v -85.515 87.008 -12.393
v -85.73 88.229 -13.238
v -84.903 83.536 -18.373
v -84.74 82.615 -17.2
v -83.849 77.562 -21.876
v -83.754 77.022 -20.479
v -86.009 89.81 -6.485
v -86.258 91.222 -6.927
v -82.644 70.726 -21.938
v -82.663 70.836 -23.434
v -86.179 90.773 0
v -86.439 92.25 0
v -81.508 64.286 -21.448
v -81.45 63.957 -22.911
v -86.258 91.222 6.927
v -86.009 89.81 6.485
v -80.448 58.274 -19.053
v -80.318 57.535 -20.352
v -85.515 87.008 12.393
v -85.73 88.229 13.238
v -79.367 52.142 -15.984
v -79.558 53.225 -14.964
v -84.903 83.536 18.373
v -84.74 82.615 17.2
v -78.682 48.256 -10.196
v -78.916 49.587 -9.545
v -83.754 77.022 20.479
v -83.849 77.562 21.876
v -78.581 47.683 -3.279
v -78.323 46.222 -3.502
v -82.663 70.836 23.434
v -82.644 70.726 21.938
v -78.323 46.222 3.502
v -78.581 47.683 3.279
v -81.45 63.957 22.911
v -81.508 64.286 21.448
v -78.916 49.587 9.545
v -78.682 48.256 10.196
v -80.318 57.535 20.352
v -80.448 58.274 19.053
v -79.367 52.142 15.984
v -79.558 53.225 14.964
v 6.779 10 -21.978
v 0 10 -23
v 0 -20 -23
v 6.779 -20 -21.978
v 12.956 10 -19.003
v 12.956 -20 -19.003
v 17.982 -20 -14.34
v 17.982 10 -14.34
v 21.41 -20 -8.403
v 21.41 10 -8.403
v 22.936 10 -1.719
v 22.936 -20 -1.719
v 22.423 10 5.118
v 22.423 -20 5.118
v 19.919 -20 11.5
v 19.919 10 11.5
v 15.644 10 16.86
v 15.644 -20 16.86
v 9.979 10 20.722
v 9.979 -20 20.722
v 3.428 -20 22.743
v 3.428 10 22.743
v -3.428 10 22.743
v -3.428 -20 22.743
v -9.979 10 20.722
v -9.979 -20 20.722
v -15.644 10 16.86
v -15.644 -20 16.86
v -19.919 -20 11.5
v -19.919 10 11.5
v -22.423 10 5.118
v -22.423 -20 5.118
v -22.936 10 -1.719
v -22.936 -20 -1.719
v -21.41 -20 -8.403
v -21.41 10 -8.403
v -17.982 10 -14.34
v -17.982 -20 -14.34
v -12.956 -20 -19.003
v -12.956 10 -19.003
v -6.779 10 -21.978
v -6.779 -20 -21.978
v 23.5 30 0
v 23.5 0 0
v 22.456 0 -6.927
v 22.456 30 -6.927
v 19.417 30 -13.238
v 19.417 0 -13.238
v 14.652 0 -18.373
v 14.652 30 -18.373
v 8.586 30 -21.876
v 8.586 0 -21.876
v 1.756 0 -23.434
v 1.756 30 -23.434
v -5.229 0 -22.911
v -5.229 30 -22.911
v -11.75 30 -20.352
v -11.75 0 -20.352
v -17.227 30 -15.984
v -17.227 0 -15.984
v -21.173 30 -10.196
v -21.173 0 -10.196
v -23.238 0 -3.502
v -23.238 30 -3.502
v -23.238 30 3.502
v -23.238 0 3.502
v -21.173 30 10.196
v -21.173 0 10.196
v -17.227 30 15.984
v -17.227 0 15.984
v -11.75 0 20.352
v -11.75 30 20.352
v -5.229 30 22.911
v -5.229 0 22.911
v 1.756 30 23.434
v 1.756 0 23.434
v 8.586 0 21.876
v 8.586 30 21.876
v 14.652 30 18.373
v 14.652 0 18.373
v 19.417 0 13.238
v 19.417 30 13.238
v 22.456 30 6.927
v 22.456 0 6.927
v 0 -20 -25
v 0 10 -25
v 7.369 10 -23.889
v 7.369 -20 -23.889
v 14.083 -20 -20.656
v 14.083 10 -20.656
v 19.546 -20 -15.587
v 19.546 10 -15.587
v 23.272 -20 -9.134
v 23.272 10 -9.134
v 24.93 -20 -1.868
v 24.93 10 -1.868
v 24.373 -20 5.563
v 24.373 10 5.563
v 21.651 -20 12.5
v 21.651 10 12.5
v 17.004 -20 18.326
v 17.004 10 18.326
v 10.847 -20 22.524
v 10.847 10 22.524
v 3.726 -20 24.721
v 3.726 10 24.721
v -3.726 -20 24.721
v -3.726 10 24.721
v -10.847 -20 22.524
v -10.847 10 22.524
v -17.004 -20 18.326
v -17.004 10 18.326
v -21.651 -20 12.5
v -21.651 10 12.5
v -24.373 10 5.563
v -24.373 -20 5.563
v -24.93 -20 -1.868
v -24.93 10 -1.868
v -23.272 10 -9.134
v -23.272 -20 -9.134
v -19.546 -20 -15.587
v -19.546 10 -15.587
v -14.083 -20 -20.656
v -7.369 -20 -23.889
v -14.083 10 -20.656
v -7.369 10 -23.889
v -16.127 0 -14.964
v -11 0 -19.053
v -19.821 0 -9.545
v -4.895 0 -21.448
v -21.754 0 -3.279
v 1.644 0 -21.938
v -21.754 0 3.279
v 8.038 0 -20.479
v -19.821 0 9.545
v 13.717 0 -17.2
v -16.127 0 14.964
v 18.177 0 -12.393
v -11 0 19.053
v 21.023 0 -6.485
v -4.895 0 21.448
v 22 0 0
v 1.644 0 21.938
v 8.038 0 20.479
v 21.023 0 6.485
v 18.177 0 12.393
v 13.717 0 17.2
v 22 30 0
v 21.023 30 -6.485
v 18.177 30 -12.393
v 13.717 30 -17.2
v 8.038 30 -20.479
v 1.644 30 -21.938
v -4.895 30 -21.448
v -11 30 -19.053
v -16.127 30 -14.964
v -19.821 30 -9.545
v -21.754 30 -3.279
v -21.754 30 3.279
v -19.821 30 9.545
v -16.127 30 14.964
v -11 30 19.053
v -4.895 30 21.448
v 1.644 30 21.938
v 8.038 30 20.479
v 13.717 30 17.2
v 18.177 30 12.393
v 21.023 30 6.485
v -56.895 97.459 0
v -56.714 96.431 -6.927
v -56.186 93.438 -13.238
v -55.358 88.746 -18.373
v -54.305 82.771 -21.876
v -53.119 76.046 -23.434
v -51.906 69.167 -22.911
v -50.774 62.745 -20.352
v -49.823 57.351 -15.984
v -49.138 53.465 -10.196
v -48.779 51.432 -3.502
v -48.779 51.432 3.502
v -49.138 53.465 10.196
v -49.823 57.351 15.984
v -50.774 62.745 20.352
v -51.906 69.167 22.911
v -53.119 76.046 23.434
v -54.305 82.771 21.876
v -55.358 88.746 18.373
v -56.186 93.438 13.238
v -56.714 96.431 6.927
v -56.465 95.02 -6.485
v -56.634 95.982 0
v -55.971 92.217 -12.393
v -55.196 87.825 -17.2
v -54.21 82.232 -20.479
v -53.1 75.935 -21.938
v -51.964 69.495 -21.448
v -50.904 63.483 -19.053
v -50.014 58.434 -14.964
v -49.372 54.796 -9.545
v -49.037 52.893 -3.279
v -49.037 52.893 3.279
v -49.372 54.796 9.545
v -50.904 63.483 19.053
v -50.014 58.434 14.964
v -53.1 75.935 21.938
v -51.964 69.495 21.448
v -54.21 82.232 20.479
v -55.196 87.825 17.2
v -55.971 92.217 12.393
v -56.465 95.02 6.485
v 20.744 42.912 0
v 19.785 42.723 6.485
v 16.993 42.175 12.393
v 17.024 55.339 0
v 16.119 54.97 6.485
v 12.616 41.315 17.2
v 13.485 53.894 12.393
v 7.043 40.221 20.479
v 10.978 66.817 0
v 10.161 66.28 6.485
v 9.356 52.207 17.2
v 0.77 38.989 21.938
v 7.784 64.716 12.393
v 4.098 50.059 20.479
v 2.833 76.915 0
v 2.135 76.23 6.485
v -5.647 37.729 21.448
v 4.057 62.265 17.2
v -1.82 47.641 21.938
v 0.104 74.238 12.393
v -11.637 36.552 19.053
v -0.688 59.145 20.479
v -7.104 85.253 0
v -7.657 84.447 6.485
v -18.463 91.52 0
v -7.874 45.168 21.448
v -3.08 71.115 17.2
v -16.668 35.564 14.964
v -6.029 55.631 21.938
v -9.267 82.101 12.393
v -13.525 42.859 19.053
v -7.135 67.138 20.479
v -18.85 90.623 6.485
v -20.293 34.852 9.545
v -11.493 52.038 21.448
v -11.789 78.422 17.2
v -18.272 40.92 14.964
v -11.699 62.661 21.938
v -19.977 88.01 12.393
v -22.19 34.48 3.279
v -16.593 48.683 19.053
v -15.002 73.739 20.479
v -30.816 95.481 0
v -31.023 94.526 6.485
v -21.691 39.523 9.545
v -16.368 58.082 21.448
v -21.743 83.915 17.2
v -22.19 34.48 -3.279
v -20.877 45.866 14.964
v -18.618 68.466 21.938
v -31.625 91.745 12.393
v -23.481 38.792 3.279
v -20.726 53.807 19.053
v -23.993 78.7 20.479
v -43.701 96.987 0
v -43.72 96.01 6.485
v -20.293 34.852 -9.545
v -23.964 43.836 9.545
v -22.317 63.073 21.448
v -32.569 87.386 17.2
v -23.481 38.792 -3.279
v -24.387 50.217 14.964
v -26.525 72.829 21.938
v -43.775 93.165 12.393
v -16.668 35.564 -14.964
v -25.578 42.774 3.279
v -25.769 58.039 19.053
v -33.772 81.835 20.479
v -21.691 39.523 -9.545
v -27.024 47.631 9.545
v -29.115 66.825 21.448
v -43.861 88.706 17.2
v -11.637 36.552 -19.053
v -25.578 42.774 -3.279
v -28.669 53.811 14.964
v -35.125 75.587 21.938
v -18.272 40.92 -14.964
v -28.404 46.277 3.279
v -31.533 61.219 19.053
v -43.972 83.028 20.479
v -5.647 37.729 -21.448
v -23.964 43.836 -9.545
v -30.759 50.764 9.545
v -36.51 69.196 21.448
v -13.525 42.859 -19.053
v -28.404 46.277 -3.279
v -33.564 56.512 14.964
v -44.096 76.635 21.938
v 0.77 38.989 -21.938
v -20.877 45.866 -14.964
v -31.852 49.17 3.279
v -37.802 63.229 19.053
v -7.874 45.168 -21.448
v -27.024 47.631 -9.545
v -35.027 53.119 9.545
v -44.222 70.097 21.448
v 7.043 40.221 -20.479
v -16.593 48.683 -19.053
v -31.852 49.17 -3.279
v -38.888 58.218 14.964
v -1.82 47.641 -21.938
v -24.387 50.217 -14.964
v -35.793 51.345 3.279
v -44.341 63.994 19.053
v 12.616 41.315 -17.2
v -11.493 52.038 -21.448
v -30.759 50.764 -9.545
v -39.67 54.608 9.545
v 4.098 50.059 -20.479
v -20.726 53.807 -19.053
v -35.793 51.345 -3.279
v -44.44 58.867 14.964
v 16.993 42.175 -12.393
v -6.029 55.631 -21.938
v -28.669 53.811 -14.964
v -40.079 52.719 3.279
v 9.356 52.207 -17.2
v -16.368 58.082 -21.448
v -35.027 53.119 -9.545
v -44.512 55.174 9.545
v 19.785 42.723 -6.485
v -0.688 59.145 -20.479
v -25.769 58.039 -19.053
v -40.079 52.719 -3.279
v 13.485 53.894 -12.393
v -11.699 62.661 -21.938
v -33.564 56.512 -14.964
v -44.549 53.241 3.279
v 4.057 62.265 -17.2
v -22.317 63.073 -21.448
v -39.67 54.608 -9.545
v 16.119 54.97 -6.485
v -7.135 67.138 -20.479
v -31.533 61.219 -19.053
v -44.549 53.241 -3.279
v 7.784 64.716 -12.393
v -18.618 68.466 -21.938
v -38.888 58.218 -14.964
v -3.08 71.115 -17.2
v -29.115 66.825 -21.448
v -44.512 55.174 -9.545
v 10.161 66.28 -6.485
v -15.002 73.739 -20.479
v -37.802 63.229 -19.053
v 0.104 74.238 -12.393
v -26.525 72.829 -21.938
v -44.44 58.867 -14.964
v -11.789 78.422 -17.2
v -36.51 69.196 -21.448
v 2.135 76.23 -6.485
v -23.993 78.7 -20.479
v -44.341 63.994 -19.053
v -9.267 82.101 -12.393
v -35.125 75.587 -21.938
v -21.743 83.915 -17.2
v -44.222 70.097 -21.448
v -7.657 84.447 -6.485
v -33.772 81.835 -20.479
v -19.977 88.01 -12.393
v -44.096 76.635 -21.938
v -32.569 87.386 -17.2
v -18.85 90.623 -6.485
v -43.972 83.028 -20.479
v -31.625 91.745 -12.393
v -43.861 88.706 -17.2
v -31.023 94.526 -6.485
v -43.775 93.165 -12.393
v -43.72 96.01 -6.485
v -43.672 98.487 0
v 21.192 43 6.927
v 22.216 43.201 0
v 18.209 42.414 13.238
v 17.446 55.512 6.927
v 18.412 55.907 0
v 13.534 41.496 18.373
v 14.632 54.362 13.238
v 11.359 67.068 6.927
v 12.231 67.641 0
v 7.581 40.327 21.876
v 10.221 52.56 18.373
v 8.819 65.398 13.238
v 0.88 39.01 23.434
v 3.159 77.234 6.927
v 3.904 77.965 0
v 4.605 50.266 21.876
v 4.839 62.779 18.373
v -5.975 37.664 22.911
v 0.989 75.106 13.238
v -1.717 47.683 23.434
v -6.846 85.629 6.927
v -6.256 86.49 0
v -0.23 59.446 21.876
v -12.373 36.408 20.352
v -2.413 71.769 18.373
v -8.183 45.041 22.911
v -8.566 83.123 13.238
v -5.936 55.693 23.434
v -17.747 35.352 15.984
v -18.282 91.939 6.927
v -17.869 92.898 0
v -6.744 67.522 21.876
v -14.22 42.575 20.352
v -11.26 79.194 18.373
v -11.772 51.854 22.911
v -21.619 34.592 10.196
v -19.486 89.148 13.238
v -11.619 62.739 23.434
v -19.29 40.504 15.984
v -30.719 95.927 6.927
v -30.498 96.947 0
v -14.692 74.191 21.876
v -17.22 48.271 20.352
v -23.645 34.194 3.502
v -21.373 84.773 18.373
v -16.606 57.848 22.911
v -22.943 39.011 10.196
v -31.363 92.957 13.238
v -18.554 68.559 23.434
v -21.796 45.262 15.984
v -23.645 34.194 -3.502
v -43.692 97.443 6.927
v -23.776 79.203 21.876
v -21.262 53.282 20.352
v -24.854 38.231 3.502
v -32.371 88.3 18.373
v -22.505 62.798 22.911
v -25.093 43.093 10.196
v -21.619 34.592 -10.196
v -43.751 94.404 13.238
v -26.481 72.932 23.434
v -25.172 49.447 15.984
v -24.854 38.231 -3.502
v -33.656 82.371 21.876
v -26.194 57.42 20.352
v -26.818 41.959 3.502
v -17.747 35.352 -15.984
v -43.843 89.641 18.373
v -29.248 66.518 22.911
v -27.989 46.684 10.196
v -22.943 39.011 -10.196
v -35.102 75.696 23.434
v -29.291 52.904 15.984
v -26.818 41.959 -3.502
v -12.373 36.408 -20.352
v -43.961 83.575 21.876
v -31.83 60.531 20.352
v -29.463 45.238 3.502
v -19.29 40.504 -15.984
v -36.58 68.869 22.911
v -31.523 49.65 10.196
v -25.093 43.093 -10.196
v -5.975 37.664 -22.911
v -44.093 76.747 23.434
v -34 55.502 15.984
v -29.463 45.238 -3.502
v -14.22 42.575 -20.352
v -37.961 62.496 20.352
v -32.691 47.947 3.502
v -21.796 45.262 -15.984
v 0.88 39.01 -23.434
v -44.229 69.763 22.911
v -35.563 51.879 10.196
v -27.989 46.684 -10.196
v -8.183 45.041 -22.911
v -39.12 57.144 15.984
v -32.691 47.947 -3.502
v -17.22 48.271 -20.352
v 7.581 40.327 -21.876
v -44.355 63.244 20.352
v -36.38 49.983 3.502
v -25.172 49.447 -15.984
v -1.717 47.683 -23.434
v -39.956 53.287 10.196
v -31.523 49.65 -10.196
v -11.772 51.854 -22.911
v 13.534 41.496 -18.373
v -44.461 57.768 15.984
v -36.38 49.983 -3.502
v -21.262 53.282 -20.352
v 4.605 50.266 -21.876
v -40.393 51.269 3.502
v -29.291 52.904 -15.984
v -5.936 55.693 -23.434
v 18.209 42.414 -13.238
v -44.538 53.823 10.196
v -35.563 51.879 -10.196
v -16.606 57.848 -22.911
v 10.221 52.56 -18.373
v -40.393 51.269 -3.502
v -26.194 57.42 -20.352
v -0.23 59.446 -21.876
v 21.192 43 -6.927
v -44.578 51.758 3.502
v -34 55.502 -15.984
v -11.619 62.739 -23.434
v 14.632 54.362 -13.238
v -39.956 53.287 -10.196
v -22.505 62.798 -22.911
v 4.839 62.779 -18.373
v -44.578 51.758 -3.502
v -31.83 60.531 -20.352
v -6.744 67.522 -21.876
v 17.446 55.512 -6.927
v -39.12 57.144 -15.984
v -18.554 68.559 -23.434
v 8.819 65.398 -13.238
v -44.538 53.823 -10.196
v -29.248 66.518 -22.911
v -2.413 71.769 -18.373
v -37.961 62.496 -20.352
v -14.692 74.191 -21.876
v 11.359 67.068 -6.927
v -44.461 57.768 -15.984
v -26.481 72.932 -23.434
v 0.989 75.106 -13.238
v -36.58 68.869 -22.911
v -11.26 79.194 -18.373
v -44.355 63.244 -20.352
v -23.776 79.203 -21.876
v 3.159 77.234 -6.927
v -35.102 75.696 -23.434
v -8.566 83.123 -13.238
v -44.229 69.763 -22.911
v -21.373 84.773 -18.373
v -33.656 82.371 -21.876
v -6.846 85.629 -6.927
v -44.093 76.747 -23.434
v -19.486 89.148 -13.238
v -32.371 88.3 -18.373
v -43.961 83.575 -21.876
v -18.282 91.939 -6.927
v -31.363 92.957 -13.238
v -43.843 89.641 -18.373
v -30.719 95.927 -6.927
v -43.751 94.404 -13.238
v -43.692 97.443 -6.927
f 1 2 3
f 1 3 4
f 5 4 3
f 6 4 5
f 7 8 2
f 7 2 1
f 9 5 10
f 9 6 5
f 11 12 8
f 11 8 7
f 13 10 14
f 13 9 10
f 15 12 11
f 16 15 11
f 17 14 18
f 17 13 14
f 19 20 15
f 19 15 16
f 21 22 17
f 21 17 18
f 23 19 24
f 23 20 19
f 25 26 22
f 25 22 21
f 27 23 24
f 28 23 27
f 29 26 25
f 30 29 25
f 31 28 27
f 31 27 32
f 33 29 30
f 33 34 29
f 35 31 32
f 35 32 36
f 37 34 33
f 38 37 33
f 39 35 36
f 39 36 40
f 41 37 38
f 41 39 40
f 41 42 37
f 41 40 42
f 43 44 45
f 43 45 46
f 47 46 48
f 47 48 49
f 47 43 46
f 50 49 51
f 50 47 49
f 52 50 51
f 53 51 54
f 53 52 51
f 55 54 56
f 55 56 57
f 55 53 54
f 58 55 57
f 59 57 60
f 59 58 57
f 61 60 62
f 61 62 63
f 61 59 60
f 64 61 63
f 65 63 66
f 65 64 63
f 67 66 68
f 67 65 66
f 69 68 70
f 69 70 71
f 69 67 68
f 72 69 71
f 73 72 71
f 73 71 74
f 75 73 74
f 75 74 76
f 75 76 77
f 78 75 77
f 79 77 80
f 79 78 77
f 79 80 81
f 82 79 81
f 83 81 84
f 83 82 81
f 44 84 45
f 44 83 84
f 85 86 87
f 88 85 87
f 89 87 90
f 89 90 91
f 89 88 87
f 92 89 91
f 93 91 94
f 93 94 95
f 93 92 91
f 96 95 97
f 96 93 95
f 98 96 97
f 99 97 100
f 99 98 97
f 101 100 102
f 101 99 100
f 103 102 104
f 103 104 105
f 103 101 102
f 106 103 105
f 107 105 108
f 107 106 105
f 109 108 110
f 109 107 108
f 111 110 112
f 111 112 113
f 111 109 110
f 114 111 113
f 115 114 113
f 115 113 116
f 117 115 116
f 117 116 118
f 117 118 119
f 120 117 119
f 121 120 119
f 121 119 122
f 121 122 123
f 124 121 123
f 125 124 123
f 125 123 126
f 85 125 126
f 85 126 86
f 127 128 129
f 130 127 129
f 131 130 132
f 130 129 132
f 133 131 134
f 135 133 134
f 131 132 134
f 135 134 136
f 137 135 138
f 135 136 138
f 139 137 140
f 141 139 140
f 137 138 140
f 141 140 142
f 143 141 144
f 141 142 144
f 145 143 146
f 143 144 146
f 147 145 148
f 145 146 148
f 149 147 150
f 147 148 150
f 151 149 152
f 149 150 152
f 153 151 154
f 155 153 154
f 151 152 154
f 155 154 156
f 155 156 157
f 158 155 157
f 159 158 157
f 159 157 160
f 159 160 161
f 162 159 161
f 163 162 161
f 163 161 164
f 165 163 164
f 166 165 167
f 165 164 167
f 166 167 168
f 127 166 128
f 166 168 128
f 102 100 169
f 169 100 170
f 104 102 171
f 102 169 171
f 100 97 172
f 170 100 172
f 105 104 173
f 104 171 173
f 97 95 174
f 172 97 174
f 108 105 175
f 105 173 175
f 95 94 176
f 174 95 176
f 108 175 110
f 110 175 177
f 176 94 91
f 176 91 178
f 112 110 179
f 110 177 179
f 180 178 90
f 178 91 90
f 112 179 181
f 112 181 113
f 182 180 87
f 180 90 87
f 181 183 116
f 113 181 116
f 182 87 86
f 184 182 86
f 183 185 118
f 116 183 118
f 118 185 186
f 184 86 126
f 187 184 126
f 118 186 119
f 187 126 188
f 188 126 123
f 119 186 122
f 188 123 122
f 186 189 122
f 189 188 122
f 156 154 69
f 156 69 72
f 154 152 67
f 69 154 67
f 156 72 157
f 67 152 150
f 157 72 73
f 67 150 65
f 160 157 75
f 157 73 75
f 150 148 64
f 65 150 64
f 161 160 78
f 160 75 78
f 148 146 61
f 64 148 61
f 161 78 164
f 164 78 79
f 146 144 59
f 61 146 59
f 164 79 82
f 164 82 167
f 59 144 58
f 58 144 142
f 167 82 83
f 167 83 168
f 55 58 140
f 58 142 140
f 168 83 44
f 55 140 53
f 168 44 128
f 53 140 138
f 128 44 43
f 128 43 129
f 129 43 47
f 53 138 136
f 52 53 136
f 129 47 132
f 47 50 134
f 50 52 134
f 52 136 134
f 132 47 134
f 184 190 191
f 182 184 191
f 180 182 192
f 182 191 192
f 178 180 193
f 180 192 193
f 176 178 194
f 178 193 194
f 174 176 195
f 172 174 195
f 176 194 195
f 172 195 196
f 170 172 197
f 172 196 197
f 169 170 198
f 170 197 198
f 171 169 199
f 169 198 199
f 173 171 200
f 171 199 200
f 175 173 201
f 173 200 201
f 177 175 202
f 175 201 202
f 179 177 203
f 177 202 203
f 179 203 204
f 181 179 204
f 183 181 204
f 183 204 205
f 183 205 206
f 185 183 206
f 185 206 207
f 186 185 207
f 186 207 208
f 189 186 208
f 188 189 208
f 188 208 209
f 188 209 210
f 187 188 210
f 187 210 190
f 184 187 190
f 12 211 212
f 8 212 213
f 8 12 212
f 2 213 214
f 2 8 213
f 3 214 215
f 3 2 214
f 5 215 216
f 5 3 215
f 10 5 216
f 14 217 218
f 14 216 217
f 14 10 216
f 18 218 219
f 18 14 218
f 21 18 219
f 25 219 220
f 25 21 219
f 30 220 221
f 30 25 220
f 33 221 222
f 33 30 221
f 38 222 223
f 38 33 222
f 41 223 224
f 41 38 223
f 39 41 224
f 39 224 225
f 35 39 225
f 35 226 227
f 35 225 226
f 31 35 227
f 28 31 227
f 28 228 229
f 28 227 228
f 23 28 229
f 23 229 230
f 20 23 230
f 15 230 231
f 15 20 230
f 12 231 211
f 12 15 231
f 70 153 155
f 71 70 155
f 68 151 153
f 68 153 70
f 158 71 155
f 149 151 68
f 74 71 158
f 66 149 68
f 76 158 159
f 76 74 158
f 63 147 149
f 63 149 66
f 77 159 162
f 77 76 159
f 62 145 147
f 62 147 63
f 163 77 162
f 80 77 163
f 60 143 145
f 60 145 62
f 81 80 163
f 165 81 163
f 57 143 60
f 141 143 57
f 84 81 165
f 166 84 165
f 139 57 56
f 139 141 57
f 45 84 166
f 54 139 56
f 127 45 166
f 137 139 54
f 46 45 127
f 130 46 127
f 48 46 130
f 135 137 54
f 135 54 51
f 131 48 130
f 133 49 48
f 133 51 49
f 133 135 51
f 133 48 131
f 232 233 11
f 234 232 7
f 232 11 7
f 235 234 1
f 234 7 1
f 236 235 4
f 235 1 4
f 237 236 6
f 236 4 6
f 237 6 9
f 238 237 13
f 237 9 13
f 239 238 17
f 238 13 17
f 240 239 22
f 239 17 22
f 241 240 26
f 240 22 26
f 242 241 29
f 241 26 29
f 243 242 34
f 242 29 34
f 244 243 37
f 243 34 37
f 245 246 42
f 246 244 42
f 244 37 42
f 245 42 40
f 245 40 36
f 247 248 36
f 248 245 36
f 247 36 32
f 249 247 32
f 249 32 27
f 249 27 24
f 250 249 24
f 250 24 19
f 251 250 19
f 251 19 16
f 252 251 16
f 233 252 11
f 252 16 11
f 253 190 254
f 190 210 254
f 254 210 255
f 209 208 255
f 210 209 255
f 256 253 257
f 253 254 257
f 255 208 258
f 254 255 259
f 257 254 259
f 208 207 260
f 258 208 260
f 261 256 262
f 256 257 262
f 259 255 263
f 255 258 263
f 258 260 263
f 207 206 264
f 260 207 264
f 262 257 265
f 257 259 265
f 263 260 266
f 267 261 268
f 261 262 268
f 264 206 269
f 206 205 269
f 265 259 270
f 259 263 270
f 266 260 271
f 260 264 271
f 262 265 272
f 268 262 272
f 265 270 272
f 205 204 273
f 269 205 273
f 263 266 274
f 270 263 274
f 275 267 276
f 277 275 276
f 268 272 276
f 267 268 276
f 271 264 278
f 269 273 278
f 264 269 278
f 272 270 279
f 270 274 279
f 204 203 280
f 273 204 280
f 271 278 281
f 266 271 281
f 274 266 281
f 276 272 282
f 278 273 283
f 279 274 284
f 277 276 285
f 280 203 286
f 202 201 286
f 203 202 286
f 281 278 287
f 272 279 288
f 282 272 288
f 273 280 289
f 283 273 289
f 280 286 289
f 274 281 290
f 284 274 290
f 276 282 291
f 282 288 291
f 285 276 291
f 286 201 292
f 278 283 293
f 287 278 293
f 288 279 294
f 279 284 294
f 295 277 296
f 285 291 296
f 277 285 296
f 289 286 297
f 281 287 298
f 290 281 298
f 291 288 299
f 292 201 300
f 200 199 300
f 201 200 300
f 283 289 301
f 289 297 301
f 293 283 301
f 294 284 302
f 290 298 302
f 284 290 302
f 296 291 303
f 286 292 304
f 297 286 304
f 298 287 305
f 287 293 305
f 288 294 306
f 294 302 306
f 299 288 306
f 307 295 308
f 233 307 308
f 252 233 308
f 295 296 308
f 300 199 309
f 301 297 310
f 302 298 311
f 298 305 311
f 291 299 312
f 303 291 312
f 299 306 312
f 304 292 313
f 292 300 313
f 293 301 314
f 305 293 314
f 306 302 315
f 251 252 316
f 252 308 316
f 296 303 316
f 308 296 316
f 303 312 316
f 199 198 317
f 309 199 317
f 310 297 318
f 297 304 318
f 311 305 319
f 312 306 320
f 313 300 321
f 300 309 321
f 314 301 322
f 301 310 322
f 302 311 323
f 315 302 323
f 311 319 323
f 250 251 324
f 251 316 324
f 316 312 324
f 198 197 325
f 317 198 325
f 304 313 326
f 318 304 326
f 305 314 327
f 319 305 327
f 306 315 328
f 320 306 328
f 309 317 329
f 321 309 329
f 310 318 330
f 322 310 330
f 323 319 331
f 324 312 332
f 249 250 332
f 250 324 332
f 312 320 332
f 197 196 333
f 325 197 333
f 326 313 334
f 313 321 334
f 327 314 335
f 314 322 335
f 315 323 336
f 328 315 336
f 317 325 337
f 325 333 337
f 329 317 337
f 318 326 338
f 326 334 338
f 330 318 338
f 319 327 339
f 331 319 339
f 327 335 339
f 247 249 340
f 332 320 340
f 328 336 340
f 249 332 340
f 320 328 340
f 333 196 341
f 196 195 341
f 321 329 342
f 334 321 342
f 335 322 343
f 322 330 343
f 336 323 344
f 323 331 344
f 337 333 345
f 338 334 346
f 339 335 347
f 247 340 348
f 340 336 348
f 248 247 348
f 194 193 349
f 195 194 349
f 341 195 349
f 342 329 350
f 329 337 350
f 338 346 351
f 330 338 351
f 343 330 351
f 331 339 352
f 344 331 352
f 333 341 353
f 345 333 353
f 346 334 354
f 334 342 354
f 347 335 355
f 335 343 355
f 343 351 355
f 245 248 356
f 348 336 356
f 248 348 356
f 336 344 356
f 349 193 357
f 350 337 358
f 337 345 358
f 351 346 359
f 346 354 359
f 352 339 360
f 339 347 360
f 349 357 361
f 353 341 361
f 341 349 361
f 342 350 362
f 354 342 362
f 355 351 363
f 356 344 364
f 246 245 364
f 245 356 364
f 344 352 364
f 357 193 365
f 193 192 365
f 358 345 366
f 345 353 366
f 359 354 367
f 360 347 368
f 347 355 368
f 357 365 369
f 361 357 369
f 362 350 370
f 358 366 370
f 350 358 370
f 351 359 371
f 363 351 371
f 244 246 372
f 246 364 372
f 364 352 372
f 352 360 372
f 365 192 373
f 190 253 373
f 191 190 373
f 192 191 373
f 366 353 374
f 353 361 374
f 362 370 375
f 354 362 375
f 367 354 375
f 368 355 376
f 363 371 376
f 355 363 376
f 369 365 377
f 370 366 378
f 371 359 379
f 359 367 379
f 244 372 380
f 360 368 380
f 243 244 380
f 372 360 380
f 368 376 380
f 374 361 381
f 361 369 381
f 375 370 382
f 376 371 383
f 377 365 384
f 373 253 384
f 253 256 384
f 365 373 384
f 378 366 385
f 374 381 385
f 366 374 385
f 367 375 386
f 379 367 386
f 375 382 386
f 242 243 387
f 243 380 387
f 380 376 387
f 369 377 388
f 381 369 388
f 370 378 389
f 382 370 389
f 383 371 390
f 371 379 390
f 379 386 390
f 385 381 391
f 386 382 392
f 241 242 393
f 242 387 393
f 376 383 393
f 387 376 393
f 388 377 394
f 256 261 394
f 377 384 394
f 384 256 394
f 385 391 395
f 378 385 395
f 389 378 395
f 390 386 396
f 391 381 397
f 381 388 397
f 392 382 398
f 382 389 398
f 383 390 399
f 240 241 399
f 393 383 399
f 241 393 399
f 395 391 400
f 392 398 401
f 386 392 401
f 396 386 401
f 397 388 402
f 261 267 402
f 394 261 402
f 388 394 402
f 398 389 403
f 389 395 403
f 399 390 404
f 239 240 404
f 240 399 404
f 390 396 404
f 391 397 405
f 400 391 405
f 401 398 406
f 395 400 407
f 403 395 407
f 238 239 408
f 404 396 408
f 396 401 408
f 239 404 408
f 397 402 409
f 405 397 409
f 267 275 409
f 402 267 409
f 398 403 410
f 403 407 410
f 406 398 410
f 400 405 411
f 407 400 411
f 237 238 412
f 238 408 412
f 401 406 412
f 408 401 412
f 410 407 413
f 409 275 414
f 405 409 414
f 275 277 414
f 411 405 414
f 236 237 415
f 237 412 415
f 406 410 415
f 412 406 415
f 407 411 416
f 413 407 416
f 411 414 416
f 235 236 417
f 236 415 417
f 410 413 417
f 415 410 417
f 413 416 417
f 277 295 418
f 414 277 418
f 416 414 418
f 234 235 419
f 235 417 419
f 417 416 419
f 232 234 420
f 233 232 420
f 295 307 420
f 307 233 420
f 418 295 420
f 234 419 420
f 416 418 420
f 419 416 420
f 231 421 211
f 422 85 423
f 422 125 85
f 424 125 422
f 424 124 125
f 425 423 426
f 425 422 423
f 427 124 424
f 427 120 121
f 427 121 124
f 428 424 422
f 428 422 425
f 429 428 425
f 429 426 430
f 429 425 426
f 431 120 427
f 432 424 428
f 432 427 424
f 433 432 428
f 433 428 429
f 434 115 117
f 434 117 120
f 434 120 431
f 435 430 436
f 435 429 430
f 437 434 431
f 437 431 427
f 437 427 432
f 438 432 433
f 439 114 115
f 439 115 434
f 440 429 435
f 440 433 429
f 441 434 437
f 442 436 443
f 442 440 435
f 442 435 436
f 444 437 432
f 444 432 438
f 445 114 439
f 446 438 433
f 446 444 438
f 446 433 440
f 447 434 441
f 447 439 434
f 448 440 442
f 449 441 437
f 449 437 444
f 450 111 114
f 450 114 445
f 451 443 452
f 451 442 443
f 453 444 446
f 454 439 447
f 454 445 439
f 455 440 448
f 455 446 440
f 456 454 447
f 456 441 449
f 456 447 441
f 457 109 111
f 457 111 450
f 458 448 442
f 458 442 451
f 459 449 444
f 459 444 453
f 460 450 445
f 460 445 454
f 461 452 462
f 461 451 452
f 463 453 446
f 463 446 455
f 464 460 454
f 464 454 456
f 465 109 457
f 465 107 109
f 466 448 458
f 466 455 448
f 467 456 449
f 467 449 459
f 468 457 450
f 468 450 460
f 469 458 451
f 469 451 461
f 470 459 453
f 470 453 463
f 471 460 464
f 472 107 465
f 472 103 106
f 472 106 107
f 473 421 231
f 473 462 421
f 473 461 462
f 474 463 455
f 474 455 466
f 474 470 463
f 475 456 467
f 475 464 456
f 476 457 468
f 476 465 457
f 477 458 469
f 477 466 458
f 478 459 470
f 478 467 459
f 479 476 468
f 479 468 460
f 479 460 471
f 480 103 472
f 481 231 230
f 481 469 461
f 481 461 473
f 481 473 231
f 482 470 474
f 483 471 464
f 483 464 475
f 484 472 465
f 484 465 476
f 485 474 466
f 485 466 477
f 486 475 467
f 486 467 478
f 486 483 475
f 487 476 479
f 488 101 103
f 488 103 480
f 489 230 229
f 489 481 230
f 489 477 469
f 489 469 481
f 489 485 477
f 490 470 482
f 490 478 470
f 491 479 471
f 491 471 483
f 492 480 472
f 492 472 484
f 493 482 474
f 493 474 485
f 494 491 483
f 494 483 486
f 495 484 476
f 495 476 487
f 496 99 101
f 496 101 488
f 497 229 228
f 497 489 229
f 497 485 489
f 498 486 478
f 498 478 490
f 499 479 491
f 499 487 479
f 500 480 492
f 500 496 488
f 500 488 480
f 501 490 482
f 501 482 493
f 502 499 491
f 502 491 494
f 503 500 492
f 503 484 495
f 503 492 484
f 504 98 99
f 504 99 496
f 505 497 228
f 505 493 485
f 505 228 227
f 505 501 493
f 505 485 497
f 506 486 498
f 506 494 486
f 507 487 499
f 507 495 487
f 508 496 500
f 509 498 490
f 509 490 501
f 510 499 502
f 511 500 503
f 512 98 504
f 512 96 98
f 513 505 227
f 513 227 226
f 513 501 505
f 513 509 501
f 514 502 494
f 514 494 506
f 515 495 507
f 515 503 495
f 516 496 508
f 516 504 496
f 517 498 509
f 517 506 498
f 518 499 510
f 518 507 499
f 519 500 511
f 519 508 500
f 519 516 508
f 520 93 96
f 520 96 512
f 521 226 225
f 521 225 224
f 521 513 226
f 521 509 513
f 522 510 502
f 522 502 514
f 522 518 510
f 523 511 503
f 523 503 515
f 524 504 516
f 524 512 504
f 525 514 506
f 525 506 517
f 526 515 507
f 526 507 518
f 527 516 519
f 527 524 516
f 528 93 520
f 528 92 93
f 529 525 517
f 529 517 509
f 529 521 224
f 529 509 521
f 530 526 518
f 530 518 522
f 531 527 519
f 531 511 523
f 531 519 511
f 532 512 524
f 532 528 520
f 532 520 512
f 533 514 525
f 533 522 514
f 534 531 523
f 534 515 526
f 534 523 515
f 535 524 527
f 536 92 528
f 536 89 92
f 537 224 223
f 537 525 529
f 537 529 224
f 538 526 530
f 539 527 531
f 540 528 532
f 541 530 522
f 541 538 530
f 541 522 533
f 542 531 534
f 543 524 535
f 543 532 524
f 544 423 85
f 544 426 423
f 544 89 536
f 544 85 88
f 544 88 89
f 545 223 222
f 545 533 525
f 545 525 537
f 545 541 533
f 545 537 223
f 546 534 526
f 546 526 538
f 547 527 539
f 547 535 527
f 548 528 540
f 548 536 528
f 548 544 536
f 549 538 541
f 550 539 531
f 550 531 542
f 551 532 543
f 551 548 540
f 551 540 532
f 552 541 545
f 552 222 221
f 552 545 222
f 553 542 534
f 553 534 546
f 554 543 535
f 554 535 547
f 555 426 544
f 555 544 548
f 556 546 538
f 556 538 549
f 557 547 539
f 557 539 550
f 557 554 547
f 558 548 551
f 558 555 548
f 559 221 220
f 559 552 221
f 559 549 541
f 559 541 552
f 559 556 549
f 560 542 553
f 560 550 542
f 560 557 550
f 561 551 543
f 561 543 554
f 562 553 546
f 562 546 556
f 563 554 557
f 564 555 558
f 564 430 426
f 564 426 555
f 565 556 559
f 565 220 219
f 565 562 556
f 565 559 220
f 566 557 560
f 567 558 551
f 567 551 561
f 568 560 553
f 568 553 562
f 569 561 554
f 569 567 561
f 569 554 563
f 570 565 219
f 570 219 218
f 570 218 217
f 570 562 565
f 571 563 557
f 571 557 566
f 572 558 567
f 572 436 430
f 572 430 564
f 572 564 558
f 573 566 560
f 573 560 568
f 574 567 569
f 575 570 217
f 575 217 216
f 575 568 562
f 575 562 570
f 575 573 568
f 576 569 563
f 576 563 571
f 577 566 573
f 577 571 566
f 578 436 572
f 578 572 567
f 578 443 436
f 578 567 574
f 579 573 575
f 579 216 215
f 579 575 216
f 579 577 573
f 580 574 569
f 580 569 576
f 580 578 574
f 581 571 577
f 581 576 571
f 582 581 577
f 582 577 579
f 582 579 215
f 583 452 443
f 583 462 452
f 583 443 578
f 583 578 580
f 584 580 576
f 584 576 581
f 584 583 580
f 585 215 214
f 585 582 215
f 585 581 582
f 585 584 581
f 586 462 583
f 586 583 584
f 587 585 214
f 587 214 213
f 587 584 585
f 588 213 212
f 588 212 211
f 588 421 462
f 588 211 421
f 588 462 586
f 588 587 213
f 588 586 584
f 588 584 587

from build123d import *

# Parameters (mm, degrees)
SKETCH_1_R           = 23.5
SKETCH_1_R_2         = 22
EXTRUDE_1_DEPTH      = 20
EXTRUDE_1_DEPTH_BACK = 10
SKETCH_3_R           = 25
SKETCH_3_R_2         = 23


with BuildPart() as part:
    # 扫描1: sweep along a path in 草图2
    with BuildLine(Plane.XY) as sweep_1_path:
        Line((0, 0), (0, 30))
        ThreePointArc((0, 30), (-16.074557564, 64.47199994), (-52.814167995, 74.316348886))
        Line((-52.814167995, 74.316348886), (-82.358400585, 69.106903556))
    # 草图1 → 扫描1 (sweep)
    with BuildSketch(Plane(origin=(0, 0, 0), x_dir=(1, 0, 0), z_dir=(0, 1, 0))):
        Circle(SKETCH_1_R)
        Circle(SKETCH_1_R_2, mode=Mode.SUBTRACT)
    sweep(path=sweep_1_path.line)


with BuildPart() as body_2:
    # 草图3 → 凸台-拉伸1 (new, two sides: drawn at the far end of the back side and taken through both)
    with BuildSketch(Plane(origin=(0, 0, 58.765701135), x_dir=(1, 0, 0), z_dir=(0, -1, 0)).offset(-EXTRUDE_1_DEPTH_BACK)):
        with Locations(Location((0, -58.765701135, 0), (0, 0, 270))):
            Circle(SKETCH_3_R)
        with Locations(Location((0, -58.765701135, 0), (0, 0, 270))):
            Circle(SKETCH_3_R_2, mode=Mode.SUBTRACT)
    extrude(amount=EXTRUDE_1_DEPTH + EXTRUDE_1_DEPTH_BACK)


solid = Compound([part.part, body_2.part])
